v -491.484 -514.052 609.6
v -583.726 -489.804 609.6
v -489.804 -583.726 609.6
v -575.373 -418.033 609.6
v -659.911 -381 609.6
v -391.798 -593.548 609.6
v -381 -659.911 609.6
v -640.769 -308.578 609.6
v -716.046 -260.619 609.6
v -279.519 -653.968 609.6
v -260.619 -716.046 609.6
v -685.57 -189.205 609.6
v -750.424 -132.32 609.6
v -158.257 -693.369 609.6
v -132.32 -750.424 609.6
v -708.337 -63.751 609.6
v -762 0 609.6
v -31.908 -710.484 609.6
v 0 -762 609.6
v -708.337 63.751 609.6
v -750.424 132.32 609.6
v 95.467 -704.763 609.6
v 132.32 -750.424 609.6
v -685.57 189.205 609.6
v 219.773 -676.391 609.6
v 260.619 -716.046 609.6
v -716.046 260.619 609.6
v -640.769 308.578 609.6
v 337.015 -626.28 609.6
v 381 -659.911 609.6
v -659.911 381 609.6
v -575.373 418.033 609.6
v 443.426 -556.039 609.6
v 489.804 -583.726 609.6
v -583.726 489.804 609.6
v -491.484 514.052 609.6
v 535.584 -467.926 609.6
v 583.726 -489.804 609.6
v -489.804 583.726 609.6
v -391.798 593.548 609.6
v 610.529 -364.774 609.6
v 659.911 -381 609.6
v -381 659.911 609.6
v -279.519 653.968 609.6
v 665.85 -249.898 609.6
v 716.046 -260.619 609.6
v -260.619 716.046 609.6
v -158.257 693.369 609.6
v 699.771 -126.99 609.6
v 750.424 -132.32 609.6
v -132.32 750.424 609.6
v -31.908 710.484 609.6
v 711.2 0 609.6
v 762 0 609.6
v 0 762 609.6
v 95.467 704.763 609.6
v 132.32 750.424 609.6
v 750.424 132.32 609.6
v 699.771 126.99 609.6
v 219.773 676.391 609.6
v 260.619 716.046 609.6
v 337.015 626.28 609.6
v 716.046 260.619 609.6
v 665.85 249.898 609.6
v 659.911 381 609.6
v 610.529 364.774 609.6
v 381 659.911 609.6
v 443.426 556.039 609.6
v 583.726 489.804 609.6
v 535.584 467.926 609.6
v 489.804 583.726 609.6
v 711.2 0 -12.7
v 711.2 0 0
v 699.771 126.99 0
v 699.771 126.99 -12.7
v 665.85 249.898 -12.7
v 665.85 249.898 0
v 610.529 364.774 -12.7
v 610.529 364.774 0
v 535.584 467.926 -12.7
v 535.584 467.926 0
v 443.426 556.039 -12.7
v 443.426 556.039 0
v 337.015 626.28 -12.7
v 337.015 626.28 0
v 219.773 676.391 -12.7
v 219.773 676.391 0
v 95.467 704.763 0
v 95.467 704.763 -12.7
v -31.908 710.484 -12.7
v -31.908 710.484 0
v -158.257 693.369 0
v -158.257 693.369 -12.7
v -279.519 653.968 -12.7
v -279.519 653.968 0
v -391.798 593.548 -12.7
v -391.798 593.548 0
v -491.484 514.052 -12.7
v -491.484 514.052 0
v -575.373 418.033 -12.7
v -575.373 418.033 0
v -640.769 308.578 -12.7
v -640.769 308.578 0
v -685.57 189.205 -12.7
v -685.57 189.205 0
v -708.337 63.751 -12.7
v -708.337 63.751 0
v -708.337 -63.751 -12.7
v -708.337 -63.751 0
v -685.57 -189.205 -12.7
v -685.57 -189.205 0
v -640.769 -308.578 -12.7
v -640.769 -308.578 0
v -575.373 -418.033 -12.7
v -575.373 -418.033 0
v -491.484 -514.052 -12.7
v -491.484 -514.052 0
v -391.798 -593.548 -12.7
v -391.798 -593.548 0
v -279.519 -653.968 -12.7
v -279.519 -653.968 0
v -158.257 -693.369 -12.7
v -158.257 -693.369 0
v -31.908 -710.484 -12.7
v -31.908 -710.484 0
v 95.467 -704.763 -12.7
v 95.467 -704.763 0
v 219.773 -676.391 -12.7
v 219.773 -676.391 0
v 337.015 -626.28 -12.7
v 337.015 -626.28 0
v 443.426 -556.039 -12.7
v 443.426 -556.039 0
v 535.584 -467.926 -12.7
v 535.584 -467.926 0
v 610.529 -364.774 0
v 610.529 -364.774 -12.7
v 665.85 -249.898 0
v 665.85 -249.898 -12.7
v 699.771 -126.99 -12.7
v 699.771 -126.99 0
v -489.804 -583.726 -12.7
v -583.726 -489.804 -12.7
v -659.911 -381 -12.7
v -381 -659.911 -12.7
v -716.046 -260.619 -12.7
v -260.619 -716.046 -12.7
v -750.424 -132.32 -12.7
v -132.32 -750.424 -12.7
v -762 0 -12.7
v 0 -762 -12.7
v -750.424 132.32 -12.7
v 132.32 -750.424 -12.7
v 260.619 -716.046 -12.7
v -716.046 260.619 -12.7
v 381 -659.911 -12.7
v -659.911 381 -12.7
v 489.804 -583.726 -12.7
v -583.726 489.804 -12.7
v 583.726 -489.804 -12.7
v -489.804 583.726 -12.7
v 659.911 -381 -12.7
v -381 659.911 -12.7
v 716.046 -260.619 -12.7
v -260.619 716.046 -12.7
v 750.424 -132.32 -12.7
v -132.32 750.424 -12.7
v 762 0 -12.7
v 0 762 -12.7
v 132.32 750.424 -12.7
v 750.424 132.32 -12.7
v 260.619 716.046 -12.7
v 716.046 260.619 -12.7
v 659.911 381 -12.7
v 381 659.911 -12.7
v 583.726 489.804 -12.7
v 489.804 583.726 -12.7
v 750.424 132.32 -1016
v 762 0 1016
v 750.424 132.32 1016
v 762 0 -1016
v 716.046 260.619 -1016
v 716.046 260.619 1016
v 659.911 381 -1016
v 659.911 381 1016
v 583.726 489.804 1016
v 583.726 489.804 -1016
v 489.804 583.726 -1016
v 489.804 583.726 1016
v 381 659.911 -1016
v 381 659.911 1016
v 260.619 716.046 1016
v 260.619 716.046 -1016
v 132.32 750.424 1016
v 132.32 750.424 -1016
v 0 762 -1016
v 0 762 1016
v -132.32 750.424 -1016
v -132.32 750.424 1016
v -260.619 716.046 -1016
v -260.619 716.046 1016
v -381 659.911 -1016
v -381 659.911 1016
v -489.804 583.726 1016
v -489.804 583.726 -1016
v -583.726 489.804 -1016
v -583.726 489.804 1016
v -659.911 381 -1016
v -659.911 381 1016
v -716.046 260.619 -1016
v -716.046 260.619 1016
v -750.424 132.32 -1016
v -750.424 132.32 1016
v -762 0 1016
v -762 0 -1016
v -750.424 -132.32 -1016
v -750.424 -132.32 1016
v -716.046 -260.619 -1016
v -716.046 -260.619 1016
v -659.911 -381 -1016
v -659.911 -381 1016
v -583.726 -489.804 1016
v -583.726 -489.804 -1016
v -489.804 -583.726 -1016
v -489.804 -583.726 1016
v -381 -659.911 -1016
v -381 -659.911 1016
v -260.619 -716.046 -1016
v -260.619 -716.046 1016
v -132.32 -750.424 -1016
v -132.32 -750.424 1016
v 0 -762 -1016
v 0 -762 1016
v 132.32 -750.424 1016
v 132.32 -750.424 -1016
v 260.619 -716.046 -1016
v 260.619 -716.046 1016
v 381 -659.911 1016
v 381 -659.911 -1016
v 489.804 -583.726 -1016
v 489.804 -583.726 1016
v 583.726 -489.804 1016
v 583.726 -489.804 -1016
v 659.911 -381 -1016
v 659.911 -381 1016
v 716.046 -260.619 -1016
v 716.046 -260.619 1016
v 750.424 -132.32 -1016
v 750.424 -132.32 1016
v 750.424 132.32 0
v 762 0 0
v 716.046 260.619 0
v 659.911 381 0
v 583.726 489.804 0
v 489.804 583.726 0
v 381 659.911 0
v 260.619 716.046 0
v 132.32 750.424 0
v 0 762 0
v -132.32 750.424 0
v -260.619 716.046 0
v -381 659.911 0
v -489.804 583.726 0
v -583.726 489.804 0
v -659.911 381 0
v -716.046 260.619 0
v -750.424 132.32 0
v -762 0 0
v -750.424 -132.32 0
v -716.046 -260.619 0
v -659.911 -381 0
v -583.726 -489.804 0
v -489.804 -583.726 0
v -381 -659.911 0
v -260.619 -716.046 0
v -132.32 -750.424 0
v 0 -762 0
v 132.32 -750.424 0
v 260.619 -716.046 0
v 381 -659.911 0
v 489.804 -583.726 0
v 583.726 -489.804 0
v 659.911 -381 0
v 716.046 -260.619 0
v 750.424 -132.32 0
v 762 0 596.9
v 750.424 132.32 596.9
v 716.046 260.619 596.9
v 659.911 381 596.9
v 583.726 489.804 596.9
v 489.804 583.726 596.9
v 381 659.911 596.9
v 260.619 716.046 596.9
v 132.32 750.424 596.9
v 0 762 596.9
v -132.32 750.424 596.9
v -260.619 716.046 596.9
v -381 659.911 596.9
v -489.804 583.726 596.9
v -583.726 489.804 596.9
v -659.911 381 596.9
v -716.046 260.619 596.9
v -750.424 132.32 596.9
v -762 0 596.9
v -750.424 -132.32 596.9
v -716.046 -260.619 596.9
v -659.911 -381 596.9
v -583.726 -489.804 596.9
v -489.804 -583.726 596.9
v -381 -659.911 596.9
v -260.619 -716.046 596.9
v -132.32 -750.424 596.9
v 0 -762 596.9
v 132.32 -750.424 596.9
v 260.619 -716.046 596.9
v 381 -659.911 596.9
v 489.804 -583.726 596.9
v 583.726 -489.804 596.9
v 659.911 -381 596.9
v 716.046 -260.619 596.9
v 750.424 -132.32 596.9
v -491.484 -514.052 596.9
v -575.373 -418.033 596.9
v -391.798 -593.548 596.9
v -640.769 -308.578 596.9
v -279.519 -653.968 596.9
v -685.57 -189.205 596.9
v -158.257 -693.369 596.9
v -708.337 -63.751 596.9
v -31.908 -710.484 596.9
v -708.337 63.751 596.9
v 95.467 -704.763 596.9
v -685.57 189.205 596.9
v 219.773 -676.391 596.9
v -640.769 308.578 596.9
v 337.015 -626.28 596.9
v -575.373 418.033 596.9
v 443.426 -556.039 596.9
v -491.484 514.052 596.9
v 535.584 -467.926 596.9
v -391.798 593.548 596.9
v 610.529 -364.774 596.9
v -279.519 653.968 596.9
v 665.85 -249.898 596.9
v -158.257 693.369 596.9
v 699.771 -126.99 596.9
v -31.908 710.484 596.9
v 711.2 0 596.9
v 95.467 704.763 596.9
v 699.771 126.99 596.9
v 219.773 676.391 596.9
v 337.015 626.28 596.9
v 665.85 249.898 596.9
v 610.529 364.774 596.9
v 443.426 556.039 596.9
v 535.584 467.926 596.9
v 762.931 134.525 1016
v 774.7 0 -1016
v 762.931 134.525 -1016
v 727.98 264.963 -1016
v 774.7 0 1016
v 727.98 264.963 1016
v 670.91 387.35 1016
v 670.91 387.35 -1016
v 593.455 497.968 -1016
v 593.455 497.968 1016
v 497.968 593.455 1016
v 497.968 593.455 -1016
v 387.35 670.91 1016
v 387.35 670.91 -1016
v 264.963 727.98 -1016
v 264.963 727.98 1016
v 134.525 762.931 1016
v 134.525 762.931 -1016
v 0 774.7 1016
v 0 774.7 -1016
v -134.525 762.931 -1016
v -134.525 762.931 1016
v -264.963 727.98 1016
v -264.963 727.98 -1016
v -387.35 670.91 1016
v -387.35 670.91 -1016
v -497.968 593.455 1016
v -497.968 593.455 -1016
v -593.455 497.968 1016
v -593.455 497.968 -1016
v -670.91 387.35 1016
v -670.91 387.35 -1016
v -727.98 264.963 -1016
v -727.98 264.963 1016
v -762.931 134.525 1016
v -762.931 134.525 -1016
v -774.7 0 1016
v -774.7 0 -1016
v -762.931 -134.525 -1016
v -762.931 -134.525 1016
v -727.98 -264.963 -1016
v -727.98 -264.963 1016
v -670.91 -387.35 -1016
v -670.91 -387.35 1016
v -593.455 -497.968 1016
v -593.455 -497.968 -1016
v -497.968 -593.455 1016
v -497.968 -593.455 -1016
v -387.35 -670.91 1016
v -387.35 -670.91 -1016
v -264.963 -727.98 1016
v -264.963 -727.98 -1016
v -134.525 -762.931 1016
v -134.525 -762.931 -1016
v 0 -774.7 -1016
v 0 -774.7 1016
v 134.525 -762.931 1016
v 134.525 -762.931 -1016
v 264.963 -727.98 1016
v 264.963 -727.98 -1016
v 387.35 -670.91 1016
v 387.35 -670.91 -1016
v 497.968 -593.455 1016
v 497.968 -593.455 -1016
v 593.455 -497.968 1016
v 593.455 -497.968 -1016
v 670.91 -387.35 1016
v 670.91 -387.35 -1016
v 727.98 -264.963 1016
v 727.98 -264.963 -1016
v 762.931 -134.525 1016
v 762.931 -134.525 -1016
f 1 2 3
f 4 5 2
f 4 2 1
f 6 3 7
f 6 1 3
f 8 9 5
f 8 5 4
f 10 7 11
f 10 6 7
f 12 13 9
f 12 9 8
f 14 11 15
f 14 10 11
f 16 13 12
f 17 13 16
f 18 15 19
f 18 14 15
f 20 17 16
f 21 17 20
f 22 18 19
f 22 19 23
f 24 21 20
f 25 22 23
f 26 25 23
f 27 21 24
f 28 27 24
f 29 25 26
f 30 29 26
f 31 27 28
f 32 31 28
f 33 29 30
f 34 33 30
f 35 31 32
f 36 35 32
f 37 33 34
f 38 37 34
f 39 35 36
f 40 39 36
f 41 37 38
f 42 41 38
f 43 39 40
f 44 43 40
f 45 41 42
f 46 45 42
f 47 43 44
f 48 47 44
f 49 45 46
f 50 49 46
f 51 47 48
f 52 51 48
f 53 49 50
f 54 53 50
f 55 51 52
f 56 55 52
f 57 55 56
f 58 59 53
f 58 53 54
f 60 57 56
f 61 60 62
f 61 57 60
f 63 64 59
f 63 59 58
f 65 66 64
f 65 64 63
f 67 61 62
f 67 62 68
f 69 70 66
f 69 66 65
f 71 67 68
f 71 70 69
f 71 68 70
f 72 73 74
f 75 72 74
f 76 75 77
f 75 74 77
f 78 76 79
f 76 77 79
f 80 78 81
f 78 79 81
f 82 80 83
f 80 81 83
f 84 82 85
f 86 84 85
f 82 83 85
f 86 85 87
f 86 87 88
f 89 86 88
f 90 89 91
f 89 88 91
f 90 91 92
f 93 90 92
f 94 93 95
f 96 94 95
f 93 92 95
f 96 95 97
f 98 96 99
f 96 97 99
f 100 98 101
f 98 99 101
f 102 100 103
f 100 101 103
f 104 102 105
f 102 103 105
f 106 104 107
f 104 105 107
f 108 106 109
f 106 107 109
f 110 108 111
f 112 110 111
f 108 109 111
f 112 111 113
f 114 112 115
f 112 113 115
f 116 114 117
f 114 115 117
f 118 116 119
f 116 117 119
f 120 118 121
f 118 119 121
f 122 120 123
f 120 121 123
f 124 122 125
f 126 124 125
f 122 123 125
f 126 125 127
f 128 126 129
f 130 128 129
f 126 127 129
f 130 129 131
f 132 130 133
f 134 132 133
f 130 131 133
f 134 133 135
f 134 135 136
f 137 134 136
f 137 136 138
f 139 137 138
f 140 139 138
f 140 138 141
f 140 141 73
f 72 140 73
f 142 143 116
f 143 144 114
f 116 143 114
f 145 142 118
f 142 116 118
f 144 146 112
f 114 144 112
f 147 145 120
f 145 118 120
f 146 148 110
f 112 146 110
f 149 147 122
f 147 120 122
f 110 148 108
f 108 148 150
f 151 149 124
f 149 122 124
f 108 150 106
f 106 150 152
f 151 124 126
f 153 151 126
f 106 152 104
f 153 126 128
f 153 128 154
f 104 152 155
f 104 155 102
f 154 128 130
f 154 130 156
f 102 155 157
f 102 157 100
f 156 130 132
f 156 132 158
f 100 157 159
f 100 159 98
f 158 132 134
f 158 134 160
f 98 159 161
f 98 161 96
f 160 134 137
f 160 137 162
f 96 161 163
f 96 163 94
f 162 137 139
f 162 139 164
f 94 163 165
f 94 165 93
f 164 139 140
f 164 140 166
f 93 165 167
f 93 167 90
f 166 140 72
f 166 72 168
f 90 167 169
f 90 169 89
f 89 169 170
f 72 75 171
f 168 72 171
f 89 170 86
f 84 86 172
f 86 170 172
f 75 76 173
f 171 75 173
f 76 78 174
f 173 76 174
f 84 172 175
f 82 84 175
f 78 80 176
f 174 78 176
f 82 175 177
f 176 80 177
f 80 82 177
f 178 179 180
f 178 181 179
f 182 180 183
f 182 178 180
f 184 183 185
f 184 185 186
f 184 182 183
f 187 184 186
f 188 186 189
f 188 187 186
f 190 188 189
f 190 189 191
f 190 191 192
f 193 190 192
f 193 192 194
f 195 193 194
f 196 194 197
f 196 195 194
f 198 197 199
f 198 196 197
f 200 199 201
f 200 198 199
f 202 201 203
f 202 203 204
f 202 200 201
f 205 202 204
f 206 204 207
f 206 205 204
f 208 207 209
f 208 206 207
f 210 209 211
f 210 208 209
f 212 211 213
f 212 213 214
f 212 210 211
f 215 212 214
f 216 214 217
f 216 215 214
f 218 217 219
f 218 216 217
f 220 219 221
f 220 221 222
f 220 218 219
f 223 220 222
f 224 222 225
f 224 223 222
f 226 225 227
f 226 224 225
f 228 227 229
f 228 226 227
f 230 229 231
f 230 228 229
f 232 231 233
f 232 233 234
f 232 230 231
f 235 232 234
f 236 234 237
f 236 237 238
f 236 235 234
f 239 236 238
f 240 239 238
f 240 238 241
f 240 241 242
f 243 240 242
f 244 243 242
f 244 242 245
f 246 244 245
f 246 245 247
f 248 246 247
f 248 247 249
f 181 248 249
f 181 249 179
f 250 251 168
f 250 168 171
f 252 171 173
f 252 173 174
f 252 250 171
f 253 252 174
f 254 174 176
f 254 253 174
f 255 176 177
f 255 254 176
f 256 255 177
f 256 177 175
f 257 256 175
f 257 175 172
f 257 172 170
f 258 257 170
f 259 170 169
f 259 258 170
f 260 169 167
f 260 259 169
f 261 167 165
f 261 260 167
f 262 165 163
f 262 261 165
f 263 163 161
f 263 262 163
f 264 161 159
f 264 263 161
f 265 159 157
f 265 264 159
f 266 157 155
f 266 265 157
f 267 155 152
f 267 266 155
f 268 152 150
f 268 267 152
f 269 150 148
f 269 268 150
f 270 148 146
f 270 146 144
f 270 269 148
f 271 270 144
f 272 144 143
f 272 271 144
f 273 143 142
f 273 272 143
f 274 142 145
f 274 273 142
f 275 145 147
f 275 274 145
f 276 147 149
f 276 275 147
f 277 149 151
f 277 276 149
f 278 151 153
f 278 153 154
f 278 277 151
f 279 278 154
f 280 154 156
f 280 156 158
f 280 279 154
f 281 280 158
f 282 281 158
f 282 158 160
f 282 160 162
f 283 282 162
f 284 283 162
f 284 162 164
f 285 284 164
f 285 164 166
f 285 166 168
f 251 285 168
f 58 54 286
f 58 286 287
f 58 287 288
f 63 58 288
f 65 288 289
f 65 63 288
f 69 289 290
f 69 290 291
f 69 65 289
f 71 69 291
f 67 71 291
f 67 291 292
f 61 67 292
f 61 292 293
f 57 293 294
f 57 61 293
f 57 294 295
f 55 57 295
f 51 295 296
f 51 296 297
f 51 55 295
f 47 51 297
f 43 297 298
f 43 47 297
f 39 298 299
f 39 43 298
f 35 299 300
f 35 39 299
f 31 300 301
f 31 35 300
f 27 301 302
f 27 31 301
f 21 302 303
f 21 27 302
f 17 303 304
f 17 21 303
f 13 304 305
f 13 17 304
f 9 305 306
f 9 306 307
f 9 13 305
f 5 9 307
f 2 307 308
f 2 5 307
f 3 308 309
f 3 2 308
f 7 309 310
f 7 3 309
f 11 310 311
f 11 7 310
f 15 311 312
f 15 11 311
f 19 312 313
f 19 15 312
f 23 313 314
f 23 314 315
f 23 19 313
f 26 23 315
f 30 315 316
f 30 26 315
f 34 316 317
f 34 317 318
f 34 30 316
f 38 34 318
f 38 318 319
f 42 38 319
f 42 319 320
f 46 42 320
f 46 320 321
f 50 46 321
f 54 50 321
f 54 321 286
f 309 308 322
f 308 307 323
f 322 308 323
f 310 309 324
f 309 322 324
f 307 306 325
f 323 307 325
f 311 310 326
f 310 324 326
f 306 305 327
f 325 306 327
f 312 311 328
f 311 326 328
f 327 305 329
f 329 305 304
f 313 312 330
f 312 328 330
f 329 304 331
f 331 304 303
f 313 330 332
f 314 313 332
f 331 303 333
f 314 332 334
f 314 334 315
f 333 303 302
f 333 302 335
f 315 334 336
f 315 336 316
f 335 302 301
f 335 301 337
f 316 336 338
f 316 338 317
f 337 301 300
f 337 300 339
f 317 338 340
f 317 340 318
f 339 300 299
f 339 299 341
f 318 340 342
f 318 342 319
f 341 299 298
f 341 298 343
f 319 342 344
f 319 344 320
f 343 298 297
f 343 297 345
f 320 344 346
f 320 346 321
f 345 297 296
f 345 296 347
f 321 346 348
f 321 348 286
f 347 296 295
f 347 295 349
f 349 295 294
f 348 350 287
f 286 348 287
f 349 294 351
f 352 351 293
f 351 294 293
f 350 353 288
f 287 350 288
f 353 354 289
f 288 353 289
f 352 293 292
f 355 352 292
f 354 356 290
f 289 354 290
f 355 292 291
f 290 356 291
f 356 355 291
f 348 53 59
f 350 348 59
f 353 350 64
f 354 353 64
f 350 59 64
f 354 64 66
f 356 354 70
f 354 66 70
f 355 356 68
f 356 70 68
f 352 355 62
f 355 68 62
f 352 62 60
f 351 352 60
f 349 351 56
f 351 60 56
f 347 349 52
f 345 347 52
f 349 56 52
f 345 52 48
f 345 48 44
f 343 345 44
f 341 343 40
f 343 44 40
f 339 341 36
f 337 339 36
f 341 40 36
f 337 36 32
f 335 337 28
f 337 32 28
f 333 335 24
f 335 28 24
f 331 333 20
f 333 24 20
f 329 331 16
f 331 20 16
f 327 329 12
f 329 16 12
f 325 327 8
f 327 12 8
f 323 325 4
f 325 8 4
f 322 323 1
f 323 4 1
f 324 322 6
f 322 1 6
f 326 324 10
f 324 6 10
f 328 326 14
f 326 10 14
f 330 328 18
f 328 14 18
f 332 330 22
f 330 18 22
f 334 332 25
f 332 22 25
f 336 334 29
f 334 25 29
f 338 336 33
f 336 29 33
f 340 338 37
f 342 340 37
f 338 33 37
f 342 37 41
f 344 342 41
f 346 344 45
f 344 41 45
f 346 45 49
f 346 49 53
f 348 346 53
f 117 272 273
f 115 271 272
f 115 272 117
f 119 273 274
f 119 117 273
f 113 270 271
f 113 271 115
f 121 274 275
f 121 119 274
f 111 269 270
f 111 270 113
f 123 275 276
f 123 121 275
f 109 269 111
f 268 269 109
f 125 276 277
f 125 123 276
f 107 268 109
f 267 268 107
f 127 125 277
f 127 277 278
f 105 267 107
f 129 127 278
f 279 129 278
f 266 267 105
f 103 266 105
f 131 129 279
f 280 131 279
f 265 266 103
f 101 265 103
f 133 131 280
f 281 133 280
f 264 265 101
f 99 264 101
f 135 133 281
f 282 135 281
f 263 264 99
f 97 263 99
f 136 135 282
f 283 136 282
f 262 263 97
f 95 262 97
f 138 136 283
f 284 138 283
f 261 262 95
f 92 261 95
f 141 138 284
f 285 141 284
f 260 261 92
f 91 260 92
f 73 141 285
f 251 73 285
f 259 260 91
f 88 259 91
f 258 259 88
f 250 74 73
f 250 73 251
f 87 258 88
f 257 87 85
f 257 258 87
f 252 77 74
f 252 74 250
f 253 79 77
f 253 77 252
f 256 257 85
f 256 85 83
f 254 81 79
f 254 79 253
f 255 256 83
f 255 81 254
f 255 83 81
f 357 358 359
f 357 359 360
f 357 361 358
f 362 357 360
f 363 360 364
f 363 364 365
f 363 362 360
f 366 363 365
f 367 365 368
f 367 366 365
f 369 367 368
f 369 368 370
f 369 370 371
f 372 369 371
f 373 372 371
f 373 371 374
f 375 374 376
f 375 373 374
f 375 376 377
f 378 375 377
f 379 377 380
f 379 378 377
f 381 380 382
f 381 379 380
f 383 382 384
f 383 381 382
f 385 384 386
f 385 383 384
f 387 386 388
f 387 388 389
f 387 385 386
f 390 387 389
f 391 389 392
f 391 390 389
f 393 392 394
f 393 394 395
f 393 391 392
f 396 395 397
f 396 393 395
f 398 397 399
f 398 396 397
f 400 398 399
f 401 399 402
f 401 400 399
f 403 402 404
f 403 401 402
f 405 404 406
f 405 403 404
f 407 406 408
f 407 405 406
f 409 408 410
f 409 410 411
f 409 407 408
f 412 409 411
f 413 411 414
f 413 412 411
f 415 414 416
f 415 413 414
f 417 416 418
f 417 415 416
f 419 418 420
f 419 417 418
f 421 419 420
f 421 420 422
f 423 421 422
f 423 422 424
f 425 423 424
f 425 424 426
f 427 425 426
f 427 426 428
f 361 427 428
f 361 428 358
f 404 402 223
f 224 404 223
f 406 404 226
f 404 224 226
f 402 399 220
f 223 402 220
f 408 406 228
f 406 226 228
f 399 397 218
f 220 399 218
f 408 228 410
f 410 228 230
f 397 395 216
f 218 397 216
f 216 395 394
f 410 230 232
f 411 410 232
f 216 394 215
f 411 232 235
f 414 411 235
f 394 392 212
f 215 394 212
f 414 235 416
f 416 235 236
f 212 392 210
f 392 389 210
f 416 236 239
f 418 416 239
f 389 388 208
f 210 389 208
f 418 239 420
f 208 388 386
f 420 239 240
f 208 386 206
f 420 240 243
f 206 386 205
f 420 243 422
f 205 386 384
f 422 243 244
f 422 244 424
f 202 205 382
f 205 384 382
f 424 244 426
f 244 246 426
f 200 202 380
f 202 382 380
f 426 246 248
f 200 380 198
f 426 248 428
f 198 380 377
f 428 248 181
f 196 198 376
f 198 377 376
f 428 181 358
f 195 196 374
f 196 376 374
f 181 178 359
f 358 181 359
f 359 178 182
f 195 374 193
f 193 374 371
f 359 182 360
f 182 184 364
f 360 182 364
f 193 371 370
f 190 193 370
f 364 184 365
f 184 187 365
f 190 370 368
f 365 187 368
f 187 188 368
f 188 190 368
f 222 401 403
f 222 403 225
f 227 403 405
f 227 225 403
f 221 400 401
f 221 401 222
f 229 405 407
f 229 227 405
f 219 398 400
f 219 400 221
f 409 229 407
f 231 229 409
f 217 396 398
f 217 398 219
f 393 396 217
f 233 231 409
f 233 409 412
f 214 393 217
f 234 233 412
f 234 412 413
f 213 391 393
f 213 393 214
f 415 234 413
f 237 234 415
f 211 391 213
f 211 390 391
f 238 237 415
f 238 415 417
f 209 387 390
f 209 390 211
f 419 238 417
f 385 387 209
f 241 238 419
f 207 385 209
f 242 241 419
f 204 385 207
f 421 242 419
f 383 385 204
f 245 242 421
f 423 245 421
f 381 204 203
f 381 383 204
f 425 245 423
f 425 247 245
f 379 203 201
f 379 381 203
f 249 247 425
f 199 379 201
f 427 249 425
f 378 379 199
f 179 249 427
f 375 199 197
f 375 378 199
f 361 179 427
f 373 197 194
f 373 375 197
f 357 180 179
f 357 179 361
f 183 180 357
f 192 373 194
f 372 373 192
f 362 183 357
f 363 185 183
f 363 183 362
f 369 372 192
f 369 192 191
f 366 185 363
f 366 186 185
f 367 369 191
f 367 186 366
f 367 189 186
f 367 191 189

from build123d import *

# Parameters (mm, degrees)
F0_R     = 762
F0_R_2   = 711.2
F1_DEPTH = 12.7
F0_R_3   = 774.7
F2_DEPTH = 1016
F4_R     = 762
F4_R_2   = 711.2
F5_DEPTH = 12.7


with BuildPart() as f1:
    # F0 (on Top) → F1 (new body)
    with BuildSketch(Plane.XY):
        Circle(F0_R)
        Circle(F0_R_2, mode=Mode.SUBTRACT)
    extrude(amount=-F1_DEPTH)


with BuildPart() as f2:
    # F0 (on Top) → F2 (new body, symmetric)
    with BuildSketch(Plane.XY):
        Circle(F0_R_3)
        Circle(F0_R, mode=Mode.SUBTRACT)
    extrude(amount=F2_DEPTH, both=True)


with BuildPart() as f5:
    # F4 (on offset) → F5 (new body)
    with BuildSketch(Plane.XY.offset(609.6)):
        Circle(F4_R)
        Circle(F4_R_2, mode=Mode.SUBTRACT)
    extrude(amount=-F5_DEPTH)


solid = Compound([f1.part, f2.part, f5.part])
